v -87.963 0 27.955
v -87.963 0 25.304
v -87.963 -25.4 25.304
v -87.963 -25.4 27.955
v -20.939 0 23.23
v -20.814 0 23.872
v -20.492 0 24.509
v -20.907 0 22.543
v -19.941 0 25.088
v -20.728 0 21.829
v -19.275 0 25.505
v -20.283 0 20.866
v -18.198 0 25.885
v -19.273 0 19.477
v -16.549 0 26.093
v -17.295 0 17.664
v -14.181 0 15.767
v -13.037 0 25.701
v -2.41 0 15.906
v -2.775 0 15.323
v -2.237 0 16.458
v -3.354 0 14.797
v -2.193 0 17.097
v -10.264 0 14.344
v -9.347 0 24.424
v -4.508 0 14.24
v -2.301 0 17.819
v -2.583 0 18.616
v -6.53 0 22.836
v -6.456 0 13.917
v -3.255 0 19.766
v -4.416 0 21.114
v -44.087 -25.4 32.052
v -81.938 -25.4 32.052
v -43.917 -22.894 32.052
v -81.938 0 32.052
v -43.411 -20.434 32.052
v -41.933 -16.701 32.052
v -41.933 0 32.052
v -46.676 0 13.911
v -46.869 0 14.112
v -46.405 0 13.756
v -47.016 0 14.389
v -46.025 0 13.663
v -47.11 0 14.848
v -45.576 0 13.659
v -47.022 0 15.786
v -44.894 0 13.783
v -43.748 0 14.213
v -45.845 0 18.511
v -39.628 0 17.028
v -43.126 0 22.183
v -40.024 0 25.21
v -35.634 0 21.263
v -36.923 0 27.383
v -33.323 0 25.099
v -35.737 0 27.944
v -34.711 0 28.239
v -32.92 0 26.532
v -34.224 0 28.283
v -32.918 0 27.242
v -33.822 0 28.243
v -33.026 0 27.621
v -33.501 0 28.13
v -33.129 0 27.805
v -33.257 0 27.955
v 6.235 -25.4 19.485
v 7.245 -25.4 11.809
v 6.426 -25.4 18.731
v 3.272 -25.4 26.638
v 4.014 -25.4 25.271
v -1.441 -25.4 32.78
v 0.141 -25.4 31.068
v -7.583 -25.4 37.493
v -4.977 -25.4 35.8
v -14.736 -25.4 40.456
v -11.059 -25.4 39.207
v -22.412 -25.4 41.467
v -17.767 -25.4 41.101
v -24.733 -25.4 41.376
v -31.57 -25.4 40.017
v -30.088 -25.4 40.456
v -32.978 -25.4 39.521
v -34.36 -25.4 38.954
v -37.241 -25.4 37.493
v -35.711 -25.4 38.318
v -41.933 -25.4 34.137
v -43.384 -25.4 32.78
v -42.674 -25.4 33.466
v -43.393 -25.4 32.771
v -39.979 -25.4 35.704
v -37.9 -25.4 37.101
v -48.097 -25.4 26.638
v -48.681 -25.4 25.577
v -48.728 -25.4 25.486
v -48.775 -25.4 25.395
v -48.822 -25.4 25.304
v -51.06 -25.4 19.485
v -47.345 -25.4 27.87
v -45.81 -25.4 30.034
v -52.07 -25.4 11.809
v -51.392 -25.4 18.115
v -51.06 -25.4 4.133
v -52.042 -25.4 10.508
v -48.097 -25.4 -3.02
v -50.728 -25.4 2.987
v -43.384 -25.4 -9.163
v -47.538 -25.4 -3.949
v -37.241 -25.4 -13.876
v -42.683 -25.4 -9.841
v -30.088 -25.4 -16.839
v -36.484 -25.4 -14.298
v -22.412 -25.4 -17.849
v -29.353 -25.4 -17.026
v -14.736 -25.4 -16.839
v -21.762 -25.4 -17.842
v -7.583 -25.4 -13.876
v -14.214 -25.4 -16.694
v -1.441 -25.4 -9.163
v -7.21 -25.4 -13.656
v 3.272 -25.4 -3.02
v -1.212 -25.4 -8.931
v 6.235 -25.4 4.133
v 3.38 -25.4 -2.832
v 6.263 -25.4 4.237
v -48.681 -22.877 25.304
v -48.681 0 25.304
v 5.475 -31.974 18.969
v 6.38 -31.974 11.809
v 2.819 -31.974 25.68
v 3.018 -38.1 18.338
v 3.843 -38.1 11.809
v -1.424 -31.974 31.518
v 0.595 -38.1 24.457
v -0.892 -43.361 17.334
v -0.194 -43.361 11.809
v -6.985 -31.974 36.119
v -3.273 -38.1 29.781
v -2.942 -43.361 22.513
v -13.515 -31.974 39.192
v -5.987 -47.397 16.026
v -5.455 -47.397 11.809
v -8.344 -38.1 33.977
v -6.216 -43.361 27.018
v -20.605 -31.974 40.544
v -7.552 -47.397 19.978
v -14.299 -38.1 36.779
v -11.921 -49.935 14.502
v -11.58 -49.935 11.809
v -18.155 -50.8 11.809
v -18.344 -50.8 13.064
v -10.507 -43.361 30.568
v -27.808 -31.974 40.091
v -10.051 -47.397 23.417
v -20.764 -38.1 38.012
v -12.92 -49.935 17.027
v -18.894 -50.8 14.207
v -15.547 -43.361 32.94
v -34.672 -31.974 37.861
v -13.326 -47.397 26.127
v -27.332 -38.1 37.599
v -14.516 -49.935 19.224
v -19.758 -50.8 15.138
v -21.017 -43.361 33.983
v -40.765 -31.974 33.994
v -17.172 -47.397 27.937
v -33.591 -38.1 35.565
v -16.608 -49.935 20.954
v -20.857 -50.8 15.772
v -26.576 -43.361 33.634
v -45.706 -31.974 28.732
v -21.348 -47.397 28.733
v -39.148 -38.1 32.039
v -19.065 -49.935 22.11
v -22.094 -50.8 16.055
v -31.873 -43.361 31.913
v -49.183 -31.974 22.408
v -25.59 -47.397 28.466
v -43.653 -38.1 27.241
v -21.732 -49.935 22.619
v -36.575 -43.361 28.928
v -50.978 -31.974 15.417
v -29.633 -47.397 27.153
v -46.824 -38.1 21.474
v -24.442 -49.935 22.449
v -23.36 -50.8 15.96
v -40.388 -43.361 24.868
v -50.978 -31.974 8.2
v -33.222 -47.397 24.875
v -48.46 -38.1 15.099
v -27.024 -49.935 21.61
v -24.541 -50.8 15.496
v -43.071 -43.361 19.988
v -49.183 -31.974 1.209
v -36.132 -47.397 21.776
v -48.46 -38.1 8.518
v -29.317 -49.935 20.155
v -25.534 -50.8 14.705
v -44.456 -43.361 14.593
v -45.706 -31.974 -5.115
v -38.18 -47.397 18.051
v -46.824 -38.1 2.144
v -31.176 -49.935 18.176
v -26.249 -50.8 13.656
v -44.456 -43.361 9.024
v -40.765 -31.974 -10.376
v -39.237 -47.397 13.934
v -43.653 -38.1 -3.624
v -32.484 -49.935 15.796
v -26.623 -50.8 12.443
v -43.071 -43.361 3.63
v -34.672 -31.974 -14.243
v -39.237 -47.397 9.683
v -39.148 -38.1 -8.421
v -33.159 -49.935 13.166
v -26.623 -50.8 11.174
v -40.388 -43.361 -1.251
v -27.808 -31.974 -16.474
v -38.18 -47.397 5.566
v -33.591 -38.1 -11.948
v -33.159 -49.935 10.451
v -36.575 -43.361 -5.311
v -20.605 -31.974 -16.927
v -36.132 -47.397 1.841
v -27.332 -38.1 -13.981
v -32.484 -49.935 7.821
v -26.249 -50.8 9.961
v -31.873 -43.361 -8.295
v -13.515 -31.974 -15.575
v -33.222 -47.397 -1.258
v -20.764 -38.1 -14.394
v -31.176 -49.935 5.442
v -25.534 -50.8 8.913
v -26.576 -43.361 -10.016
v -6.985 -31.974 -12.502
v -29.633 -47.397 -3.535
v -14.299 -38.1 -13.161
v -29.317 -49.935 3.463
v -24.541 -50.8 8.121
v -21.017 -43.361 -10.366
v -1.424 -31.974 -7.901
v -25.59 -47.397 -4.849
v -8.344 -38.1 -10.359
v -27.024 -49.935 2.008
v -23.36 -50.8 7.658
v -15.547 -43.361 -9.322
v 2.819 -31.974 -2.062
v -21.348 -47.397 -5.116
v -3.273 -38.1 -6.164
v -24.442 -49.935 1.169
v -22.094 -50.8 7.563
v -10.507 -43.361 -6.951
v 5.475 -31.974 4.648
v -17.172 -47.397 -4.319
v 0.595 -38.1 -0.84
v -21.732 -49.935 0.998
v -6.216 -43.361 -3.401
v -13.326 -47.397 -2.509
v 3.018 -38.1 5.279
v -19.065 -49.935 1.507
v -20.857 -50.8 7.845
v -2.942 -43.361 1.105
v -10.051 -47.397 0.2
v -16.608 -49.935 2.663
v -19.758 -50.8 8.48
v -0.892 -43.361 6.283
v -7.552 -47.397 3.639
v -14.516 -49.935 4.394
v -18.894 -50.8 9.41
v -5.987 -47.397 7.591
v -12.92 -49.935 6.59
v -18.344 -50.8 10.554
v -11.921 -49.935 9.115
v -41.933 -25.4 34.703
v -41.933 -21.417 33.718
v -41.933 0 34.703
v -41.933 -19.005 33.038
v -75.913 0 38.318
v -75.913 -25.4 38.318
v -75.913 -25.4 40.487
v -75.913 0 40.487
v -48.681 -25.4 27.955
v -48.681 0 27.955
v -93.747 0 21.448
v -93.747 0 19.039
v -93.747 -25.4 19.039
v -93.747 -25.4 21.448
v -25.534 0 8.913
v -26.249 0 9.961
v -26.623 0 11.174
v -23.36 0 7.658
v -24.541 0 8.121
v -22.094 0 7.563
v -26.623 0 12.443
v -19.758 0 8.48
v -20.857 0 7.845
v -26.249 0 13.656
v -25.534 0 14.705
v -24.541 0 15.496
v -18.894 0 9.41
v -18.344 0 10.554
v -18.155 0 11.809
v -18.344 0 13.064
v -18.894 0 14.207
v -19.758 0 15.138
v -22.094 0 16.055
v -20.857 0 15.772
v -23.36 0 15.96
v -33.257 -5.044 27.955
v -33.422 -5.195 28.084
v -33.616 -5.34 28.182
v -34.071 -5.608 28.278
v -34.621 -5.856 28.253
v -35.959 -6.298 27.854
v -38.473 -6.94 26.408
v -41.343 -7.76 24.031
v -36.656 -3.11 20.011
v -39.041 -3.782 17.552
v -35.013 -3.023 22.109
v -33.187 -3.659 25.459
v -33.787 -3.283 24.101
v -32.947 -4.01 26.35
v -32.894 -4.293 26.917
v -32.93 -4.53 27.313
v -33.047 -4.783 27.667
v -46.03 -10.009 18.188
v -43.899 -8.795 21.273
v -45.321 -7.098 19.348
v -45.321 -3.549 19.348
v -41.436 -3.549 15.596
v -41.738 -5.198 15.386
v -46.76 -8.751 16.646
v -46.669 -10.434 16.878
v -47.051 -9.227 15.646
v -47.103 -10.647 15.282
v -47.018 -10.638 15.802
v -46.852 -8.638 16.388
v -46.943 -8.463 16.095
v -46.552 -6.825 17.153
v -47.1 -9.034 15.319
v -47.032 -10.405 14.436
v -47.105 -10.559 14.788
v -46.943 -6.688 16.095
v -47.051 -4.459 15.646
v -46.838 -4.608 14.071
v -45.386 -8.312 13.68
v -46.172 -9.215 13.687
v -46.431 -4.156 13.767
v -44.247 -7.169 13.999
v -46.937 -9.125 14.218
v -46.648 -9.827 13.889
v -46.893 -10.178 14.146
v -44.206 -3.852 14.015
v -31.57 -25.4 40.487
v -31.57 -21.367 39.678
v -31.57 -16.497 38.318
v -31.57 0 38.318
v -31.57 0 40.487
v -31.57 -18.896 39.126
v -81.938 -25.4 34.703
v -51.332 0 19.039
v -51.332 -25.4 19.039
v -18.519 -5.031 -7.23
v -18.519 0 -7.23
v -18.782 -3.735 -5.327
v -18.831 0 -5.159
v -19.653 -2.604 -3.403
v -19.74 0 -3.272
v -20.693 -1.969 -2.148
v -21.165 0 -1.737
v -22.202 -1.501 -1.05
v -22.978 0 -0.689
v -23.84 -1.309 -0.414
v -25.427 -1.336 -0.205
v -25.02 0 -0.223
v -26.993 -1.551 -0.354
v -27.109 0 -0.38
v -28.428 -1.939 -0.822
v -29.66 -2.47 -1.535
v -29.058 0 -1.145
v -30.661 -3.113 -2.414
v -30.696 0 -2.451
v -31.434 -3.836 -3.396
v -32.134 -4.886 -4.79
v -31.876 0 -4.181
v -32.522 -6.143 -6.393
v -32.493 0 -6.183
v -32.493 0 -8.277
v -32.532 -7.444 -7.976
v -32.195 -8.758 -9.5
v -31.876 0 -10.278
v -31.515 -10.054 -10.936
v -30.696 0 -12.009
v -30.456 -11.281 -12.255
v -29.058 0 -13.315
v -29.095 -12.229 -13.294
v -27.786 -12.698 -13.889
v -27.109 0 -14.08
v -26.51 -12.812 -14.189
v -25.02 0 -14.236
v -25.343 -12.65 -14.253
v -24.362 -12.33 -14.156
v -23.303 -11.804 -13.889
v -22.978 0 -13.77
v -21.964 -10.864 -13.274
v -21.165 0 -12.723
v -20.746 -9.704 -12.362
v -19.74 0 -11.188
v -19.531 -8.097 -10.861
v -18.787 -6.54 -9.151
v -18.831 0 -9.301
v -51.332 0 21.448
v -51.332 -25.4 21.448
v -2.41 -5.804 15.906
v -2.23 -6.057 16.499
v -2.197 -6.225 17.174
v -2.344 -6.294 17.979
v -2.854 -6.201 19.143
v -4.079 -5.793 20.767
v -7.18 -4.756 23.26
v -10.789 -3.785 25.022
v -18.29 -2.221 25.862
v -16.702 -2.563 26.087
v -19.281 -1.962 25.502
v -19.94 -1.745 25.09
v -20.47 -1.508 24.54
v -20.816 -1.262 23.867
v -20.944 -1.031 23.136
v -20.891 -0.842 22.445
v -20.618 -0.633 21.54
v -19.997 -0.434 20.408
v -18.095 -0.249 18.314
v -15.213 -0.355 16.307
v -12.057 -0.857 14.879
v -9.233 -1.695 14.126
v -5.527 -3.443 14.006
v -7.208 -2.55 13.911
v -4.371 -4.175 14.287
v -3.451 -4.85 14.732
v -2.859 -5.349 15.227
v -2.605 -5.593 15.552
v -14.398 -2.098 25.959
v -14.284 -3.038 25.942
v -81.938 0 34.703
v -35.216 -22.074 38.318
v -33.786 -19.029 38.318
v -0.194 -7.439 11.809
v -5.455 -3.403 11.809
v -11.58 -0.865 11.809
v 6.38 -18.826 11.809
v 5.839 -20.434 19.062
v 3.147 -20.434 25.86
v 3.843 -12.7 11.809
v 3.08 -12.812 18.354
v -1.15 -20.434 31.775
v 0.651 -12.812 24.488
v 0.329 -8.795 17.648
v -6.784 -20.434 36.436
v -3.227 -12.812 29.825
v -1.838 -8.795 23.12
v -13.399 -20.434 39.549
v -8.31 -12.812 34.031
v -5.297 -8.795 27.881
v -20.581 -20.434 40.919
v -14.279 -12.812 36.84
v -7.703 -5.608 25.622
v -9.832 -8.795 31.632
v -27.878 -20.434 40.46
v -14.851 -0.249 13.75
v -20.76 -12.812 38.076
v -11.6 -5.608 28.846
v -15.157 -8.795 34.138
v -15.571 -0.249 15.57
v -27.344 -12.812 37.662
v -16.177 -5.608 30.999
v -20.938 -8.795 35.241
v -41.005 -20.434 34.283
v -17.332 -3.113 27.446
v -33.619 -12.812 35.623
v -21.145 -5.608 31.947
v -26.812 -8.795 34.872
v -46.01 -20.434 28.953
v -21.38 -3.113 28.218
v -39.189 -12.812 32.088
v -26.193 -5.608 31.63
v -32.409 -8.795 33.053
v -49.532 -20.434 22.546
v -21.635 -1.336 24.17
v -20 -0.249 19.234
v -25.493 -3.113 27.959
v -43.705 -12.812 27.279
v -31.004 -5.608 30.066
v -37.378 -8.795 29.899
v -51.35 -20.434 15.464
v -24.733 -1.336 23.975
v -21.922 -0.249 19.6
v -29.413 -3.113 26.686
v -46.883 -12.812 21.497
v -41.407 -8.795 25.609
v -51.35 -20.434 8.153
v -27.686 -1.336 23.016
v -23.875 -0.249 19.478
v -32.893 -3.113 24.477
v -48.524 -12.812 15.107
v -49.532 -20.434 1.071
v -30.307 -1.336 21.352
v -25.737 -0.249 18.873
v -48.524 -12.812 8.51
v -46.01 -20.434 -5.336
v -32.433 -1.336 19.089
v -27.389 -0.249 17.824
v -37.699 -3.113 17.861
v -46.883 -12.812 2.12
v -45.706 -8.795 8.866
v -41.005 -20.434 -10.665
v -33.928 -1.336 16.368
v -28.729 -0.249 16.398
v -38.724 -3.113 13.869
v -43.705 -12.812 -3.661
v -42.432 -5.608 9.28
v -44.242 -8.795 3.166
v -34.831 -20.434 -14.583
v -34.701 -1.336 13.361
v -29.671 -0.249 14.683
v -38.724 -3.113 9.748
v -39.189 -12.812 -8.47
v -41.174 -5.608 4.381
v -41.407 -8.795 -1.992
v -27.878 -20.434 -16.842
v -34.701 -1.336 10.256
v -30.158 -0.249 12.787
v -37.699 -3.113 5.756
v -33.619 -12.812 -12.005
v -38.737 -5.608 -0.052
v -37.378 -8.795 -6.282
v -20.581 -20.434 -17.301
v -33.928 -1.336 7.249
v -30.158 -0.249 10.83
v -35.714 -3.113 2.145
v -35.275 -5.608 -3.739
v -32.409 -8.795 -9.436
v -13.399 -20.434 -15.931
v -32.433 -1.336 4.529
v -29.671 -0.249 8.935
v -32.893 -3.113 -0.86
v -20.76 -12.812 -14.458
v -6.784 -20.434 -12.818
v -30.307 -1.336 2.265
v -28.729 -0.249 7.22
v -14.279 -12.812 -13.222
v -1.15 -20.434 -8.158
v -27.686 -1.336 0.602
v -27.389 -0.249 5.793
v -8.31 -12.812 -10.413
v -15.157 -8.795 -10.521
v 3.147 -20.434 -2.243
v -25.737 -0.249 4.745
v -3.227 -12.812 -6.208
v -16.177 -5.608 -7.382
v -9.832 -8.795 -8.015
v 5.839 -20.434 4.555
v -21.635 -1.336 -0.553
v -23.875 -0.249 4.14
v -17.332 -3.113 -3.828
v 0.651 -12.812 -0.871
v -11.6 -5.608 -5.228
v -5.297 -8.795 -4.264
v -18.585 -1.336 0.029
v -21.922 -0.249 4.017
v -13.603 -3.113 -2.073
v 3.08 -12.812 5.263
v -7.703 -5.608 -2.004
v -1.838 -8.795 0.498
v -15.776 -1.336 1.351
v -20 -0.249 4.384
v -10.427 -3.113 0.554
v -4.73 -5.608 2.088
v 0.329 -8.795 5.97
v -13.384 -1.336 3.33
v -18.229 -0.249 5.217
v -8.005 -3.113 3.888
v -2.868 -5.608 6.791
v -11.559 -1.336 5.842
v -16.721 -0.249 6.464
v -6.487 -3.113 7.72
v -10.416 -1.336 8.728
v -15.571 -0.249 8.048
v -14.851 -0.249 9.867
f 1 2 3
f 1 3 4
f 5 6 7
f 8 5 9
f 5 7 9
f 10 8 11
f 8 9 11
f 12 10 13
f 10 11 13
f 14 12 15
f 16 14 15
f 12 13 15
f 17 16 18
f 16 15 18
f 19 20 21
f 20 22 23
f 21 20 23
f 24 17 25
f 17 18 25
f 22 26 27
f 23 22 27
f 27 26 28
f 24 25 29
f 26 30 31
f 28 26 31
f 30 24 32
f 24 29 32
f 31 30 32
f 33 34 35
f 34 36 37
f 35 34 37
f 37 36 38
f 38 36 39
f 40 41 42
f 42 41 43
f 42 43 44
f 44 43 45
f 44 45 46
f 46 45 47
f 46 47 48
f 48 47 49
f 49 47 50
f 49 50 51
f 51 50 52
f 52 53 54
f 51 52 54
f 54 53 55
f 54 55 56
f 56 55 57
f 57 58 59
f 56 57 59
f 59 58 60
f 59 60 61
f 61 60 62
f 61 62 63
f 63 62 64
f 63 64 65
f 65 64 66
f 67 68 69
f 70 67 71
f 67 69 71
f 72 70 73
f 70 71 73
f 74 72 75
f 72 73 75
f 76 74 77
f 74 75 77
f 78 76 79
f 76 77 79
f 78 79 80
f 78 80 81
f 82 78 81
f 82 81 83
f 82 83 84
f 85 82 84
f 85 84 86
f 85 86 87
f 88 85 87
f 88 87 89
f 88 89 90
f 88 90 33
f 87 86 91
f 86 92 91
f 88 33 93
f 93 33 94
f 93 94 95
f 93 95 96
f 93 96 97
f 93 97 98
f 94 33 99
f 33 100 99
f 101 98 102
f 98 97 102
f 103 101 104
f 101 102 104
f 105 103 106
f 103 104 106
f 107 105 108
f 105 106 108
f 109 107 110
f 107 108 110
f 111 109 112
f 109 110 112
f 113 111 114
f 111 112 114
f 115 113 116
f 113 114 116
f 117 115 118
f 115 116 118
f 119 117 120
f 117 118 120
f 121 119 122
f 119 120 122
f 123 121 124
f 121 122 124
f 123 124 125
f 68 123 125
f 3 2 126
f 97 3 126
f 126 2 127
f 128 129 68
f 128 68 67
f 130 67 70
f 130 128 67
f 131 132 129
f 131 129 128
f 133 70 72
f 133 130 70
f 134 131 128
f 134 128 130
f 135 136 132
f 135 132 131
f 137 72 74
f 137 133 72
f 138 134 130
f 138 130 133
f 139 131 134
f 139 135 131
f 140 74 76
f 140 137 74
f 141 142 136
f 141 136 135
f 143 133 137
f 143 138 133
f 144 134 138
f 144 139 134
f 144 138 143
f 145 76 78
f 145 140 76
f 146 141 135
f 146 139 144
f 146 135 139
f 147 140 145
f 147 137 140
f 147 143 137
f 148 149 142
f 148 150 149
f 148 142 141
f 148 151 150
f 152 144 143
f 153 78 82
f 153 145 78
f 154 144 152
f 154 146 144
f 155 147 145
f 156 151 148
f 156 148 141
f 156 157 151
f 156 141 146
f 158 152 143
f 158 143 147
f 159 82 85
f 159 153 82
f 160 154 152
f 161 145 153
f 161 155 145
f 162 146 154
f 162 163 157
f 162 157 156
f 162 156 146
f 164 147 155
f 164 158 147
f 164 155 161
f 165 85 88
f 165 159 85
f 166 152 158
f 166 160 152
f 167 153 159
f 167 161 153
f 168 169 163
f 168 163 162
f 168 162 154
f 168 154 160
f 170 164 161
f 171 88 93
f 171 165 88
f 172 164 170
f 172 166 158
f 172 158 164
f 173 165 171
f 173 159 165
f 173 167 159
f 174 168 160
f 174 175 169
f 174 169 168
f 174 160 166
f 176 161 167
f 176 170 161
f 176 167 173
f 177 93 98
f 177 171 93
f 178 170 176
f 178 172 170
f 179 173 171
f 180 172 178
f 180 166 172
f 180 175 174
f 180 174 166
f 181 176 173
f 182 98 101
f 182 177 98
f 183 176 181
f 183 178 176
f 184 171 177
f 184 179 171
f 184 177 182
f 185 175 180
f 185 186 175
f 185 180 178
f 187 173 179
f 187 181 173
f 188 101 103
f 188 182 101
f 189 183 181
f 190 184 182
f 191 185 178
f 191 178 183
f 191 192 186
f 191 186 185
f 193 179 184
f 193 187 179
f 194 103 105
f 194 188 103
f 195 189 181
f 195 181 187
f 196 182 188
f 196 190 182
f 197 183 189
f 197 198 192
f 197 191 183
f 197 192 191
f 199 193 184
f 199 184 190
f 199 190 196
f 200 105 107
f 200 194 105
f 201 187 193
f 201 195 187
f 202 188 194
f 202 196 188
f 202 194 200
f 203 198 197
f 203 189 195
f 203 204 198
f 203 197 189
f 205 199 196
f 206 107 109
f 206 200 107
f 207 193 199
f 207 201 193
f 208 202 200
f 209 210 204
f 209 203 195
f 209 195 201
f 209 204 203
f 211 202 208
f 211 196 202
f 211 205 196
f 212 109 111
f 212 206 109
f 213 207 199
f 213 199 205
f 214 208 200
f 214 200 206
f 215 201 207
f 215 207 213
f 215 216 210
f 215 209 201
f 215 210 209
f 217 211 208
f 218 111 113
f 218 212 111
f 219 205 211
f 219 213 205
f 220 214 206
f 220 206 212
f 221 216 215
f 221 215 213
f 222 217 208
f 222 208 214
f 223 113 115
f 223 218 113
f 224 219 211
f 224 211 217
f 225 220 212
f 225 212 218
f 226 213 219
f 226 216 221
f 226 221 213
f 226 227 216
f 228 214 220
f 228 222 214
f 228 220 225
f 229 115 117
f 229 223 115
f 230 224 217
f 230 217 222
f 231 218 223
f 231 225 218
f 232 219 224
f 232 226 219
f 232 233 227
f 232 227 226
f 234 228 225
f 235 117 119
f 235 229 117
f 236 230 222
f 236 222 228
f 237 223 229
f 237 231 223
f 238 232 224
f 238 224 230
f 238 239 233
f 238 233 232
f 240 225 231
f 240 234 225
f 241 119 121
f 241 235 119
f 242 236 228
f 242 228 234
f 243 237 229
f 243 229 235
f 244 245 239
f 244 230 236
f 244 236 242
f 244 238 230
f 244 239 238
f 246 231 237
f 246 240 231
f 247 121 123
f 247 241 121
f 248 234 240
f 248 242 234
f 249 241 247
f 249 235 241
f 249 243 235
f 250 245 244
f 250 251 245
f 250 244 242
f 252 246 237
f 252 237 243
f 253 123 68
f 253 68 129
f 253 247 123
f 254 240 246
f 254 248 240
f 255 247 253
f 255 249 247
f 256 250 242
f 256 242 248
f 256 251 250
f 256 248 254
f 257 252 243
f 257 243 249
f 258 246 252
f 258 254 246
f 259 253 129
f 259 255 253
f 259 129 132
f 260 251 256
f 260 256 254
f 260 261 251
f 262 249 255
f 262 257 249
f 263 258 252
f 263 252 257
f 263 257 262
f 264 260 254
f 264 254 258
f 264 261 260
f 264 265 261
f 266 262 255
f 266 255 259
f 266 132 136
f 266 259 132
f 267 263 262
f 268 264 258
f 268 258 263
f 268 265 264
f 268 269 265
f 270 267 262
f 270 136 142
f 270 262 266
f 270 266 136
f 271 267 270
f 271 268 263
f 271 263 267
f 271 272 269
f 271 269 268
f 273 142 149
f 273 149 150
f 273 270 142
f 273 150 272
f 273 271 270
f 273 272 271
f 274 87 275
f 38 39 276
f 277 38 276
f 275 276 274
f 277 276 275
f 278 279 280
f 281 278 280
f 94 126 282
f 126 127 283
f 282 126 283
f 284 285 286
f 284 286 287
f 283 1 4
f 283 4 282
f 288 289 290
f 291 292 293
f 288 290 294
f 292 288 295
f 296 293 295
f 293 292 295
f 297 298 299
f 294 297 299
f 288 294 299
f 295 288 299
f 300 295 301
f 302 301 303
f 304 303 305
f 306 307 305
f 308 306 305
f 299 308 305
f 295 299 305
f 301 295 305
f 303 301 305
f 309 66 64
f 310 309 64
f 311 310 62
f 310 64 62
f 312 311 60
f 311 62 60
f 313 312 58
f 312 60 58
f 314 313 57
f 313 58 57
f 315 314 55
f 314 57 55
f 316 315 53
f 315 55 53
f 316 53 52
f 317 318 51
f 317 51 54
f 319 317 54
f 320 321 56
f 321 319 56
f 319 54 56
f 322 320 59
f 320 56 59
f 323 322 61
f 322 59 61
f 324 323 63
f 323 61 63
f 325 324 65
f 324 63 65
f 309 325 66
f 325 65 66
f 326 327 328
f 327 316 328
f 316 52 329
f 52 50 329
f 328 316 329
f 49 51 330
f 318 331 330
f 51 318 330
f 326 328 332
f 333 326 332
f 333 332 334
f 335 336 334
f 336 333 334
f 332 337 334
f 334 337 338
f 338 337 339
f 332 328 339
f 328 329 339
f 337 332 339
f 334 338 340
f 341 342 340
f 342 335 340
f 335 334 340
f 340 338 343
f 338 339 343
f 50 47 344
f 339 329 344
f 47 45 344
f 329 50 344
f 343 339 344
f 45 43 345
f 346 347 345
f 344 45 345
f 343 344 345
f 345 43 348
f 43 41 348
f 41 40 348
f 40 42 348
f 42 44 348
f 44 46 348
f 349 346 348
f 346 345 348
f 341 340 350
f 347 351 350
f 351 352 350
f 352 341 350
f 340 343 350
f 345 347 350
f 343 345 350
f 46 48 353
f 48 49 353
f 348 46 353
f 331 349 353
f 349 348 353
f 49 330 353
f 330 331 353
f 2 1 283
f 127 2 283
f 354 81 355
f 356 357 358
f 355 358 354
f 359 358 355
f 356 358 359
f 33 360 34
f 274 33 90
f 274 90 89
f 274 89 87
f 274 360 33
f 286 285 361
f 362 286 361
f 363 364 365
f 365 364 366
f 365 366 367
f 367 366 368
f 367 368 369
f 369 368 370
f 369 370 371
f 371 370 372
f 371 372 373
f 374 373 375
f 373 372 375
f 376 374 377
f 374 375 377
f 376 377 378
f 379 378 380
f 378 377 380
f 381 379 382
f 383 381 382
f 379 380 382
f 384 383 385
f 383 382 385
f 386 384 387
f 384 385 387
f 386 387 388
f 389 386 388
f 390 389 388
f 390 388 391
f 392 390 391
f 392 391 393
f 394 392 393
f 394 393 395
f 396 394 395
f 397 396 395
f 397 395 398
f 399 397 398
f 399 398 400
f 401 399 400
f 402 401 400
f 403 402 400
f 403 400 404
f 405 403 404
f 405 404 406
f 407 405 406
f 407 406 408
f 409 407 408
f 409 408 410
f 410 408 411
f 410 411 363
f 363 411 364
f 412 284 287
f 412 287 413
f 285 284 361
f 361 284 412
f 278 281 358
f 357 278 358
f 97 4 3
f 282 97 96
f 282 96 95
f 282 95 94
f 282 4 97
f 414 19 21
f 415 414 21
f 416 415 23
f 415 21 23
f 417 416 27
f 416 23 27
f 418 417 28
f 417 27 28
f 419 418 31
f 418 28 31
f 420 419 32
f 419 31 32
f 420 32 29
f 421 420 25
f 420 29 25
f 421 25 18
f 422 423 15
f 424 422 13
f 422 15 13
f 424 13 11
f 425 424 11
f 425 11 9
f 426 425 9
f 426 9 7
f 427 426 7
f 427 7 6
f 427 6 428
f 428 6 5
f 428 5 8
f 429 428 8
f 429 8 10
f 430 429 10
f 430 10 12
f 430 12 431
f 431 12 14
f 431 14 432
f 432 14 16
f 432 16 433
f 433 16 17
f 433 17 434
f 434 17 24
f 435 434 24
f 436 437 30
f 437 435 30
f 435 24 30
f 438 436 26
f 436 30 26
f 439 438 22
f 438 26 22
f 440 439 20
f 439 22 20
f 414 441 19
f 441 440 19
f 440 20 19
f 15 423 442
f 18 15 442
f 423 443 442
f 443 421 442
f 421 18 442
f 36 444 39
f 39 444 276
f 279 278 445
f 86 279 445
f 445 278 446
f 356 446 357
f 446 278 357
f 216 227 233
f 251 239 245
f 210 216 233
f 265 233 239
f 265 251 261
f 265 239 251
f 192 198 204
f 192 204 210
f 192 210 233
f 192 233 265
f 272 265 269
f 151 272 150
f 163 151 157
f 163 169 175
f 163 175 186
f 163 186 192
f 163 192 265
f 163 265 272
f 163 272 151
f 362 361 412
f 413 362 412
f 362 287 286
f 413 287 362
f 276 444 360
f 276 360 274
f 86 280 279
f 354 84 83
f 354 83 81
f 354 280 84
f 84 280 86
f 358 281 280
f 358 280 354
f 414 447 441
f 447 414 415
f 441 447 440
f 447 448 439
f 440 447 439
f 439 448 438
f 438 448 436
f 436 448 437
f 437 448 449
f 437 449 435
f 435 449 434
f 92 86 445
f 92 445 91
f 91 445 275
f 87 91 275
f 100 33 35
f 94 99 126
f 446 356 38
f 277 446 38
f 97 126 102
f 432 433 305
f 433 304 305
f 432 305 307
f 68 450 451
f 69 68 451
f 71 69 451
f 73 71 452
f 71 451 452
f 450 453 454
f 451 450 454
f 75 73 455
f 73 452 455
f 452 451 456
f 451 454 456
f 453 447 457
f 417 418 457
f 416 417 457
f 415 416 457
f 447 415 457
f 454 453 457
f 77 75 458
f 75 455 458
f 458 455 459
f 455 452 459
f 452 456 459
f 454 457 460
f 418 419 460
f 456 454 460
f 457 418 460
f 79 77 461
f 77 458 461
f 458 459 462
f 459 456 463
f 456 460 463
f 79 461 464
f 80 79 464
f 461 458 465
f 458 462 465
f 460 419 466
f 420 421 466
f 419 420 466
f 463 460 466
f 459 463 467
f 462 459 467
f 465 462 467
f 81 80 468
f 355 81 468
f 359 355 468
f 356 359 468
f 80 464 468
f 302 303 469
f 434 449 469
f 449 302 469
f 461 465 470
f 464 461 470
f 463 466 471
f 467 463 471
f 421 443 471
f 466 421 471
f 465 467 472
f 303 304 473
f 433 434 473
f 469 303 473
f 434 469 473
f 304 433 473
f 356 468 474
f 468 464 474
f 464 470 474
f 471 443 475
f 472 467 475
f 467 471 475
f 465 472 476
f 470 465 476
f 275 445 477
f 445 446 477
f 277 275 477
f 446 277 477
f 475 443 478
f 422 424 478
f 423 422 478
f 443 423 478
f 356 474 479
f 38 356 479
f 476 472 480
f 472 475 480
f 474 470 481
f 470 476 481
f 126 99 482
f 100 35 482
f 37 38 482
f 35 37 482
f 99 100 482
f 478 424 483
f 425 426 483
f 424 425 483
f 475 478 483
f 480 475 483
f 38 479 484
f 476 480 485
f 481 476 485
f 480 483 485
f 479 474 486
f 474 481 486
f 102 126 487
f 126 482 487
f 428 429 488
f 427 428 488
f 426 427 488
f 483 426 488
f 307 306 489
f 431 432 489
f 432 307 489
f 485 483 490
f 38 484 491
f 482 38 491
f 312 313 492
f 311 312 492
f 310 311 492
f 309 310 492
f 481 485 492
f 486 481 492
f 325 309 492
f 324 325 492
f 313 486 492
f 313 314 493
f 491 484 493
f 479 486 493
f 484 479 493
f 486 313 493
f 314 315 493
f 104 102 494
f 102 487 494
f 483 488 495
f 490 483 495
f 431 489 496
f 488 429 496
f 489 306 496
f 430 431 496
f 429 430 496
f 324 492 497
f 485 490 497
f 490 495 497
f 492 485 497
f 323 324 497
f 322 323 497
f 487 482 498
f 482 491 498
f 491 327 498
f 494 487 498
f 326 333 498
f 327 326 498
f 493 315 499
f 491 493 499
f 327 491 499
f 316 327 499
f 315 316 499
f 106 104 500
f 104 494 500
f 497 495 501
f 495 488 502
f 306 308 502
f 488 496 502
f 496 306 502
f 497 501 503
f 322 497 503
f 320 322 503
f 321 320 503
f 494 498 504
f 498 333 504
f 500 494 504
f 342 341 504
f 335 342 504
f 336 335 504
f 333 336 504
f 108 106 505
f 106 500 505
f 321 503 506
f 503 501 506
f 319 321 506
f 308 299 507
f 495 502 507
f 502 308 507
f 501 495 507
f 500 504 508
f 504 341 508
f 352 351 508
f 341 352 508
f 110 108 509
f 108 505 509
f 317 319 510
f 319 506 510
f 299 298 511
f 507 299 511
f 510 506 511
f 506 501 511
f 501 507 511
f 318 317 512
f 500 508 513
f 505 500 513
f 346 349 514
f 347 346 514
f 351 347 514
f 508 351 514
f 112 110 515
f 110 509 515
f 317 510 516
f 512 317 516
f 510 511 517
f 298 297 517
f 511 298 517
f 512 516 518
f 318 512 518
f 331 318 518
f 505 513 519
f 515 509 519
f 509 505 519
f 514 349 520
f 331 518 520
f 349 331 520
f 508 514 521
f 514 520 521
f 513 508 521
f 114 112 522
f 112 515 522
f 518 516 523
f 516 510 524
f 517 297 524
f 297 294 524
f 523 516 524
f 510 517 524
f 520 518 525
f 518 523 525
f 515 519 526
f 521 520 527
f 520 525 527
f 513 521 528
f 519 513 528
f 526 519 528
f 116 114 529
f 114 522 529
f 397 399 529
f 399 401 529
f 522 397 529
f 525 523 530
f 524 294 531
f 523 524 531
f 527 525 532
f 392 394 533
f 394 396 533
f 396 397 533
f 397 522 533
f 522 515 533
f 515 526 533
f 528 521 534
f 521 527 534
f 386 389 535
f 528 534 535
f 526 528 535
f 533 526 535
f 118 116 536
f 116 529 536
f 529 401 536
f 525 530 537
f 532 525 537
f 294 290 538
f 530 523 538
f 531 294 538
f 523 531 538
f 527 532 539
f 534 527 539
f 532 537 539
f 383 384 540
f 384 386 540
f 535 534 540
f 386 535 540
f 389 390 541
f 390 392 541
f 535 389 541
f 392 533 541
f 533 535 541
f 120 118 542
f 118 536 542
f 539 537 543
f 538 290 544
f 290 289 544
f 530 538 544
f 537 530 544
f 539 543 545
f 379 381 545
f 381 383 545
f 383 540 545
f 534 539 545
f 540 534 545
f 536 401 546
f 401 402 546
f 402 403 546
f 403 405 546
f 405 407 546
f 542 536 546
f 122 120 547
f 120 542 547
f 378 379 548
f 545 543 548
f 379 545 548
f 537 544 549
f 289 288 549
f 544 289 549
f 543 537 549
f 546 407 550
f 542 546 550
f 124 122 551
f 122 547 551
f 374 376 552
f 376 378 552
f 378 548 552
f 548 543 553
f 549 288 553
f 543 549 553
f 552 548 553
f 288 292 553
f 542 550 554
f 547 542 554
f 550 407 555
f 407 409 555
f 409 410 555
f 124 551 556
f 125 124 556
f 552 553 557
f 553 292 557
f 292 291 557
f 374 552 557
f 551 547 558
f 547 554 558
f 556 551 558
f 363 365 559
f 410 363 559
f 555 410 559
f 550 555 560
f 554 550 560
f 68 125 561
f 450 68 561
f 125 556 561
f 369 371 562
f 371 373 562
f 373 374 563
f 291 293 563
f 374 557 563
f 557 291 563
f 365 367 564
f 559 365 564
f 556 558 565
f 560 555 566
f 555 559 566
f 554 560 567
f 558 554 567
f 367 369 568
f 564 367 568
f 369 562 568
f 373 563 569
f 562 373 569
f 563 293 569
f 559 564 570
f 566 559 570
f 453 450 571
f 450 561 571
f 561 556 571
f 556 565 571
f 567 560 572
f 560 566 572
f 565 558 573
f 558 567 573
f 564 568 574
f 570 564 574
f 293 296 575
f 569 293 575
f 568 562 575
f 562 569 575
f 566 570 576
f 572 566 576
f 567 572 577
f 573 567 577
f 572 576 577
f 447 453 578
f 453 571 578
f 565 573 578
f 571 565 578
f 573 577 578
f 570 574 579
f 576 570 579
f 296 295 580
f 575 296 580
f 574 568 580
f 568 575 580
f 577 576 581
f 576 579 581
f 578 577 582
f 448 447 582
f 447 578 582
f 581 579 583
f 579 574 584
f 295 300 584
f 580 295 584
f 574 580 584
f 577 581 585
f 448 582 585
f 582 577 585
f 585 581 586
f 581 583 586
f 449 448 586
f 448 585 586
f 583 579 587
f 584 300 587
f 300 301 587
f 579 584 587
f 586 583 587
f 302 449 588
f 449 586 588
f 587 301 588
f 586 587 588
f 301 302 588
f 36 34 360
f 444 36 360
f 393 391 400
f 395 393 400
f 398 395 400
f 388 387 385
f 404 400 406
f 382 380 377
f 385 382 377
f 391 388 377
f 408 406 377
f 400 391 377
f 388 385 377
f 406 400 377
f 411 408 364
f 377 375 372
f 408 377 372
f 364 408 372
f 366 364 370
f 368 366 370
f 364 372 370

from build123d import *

# Parameters (mm, degrees)
F0_R     = 29.6579287445
F1_DEPTH = 50.8
F2_R     = 25.39999
F3_R     = 7.026121943
F3_W     = 44.3428866565
F3_H     = 2.1689496934
F3_W_2   = 40.0050021708
F3_H_2   = 2.6509352028
F3_W_3   = 39.2820164561
F3_H_3   = 2.6509370655
F5_DEPTH = 25.4
F3_W_4   = 42.4149371684
F3_H_4   = 2.4099387228


# Not quite as in the source:
# - a fillet or chamfer is up to 0.001 mm smaller than in the source, because OpenCascade refuses the exact size
# - the program builds the solid bodies; features that only make, move or delete a surface that nothing else refers to are left out


with BuildPart() as f1:
    # F0 (on Front) → F1 (new body)
    with BuildSketch(Plane.XZ):
        with Locations((-22.4124398082, 11.8087045848)):
            Circle(F0_R)
    extrude(amount=F1_DEPTH)

    # F2 (radius 25.4 in the source; OpenCascade refuses exactly that, so slightly less here)
    f2_edges = [f1.edges().sort_by_distance(p)[0] for p in [
        (-52.070369, -50.8, 11.808705),
        (-52.070369, 0, 11.808705),
    ]]
    fillet(f2_edges, radius=F2_R)

    # F3 (on Front) → F5 (join)
    with BuildSketch(Plane.XZ):
        with BuildLine():
            add(Edge.make_bspline(
                [(-33.2571677864, 27.9553029686), (-37.1422937885, 31.7064598227), (-45.3214823641, 19.3476406869), (-53.5006709397, 6.9888215512), (-41.436356362, 15.5964838329), (-29.3720417843, 24.2041461146), (-33.2571677864, 27.9553029686)],
                knots=[0, 0, 0, 2.0943951024, 2.0943951024, 4.1887902048, 4.1887902048, 6.2831853072, 6.2831853072, 6.2831853072], degree=2, weights=[1, 0.5, 1, 0.5, 1, 0.5, 1]))
        make_face()
        with BuildLine():
            add(Edge.make_bspline(
                [(-2.4099403527, 15.9056037664), (1.0870038831, 23.7223034997), (-14.398125451, 25.9592996115), (-29.8832547851, 28.1962957233), (-17.8950696867, 18.1425998783), (-5.9068845884, 8.0889040332), (-2.4099403527, 15.9056037664)],
                knots=[0, 0, 0, 2.0943951024, 2.0943951024, 4.1887902048, 4.1887902048, 6.2831853072, 6.2831853072, 6.2831853072], degree=2, weights=[1, 0.5, 1, 0.5, 1, 0.5, 1]))
        make_face()
        with Locations((-25.5453623831, -7.2298194282)):
            Circle(F3_R)
        with Locations((-53.7416581064, 39.4025165588)):
            Rectangle(F3_W, F3_H)
        with Locations((-61.9354527444, 33.377667889)):
            Rectangle(F3_W_2, F3_H_2)
        with Locations((-68.3217905462, 26.6298344359)):
            Rectangle(F3_W_3, F3_H_3)
    extrude(amount=F5_DEPTH)


with BuildPart() as f5:
    # F3 (on Front) → F5, piece 2 (new body)
    with BuildSketch(Plane.XZ):
        with Locations((-72.5391861051, 20.2434938401)):
            Rectangle(F3_W_4, F3_H_4)
    extrude(amount=F5_DEPTH)


solid = Compound([f1.part, f5.part])
